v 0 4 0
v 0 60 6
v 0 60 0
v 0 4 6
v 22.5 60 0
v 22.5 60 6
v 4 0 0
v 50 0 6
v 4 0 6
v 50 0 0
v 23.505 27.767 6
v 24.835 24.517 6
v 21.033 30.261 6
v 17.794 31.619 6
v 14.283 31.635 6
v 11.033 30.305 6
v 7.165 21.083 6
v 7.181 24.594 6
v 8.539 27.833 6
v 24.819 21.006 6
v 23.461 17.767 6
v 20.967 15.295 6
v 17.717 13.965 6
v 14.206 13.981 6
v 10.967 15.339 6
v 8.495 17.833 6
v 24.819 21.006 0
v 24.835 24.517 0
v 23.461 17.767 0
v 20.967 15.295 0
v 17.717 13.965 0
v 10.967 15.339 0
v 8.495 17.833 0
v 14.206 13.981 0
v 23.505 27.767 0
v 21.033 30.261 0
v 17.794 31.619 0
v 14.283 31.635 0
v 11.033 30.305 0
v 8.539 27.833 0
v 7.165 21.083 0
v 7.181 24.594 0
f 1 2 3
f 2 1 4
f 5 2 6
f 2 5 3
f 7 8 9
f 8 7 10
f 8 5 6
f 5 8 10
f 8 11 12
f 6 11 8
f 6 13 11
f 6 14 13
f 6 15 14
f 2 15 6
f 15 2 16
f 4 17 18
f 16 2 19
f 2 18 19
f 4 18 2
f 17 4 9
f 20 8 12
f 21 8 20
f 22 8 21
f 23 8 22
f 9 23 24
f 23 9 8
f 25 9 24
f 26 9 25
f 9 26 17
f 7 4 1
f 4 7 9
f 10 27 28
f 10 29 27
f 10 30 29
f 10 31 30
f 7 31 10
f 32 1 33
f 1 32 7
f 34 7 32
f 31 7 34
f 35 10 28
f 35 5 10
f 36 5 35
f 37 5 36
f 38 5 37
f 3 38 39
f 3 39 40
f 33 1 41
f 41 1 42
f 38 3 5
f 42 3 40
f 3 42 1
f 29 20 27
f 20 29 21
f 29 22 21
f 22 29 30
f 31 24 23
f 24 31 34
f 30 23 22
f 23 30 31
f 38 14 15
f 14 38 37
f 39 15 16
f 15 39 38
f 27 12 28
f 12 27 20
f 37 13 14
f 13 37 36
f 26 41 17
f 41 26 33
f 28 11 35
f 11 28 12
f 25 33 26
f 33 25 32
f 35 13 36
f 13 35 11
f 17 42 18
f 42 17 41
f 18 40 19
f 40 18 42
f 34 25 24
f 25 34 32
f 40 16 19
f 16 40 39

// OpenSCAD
$fn = 32;

// ----------------------------------------------------------------------
// Bracket plate: gusset 50 x 60
// ----------------------------------------------------------------------

// --- parameters (mm) ---
hole_r = 4;               // bolt hole radius
plate_t = 6;              // plate thickness, Z (extrusion height)
gus_a = 50;               // base length
gus_b = 60;               // height
top_x = 22.5;             // top edge X of the angled cut
light_r = 9;              // lightening hole radius
fit_tol = 0.05;           // declared fit tolerance (prompt contract)
free_tol = 0.2;           // declared free tolerance (prompt contract)

light_d = 2 * light_r;

profile = [[4, 0], [25, 0], [50, 0], [22.5, 60], [0, 60], [0, 4]];  // primary outline, 6 points, counter clockwise
void_1 = [[24.835, 24.517], [23.505, 27.767], [21.033, 30.261], [17.794, 31.619], [14.283, 31.635], [11.033, 30.305], [8.539, 27.833], [7.181, 24.594], [7.165, 21.083], [8.495, 17.833], [10.967, 15.339], [14.206, 13.981], [17.717, 13.965], [20.967, 15.295], [23.461, 17.767], [24.819, 21.006]];  // lightening hole, 16 points

// --- the one profile operation ---
difference() {
  linear_extrude(height = plate_t) polygon(points = profile);
  translate([0, 0, -1])
    linear_extrude(height = plate_t + 2) polygon(points = void_1);
}
